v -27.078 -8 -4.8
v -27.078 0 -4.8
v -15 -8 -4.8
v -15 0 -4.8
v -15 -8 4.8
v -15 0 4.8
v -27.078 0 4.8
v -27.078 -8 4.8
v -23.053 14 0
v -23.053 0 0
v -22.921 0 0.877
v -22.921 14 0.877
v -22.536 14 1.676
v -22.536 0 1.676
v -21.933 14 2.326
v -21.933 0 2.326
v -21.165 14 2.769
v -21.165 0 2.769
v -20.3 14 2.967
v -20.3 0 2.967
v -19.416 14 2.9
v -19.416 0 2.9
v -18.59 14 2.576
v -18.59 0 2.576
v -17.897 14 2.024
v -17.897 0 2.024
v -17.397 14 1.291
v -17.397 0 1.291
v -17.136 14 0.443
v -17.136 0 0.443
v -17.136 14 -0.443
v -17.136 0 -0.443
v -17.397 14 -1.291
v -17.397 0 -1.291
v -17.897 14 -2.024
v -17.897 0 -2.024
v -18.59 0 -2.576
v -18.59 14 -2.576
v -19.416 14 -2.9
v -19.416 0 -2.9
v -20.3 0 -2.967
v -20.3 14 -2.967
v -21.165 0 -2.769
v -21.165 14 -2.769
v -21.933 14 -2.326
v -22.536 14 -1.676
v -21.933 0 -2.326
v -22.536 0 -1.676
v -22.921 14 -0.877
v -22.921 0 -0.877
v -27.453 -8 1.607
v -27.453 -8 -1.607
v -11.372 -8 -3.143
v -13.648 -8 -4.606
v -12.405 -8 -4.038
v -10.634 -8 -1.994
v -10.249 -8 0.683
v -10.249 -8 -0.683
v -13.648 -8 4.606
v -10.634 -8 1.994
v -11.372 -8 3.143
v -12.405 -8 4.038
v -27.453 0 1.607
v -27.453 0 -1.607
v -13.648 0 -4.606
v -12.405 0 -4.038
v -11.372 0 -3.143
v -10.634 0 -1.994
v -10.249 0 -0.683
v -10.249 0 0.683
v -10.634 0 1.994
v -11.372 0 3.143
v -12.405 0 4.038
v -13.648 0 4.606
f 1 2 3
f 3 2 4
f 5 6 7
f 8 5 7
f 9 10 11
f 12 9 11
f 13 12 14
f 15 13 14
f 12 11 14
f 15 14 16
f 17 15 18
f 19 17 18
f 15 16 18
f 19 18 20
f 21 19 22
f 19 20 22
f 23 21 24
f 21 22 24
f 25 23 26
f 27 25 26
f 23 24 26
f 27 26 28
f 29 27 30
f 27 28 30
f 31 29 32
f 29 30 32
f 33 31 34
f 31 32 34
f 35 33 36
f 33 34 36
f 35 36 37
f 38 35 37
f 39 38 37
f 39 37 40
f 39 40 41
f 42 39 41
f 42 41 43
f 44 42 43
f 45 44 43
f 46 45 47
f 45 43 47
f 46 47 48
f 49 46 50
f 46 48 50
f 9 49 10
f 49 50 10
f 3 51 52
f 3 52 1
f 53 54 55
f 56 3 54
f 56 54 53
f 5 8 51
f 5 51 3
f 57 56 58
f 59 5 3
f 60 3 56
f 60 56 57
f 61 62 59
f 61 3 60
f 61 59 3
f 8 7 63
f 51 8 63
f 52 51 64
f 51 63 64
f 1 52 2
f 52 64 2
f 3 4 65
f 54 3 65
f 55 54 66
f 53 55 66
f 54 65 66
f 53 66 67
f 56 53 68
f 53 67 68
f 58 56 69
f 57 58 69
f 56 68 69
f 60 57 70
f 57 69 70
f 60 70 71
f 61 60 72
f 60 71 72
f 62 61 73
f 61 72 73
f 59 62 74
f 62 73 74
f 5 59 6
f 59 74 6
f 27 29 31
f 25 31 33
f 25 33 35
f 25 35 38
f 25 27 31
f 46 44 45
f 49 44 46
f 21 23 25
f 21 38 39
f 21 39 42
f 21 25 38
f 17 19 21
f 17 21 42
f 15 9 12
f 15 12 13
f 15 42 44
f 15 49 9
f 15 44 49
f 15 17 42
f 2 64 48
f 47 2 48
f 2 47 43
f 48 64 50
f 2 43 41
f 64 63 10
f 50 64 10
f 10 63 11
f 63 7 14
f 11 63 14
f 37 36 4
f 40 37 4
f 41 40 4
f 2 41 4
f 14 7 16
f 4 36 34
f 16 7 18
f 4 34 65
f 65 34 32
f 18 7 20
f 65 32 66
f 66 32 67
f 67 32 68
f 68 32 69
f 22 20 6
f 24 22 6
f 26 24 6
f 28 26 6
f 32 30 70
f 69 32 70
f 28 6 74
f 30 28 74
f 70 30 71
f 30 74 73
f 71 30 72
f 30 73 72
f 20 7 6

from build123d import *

# Parameters (mm, degrees)
F1_DEPTH = 8
F2_R     = 2.975
F3_DEPTH = 14


with BuildPart() as f1:
    # F0 (on Front) → F1 (new body)
    with BuildSketch(Plane.XZ):
        with BuildLine():
            Line((-15, 4.8), (-27.077851, 4.8))
            ThreePointArc((-27.077851, 4.8), (-27.5, 0), (-27.077851, -4.8))
            Line((-27.077851, -4.8), (-15, -4.8))
            ThreePointArc((-15, -4.8), (-10.2, 0), (-15, 4.8))
        make_face()
    extrude(amount=F1_DEPTH)

    # F2 (on face) → F3 (join)
    with BuildSketch(Plane(origin=(0, 0, 0), x_dir=(-1, 0, 0), z_dir=(0, 1, 0))):
        with Locations((20.077851, 0)):
            Circle(F2_R)
    extrude(amount=F3_DEPTH)


solid = f1.part
